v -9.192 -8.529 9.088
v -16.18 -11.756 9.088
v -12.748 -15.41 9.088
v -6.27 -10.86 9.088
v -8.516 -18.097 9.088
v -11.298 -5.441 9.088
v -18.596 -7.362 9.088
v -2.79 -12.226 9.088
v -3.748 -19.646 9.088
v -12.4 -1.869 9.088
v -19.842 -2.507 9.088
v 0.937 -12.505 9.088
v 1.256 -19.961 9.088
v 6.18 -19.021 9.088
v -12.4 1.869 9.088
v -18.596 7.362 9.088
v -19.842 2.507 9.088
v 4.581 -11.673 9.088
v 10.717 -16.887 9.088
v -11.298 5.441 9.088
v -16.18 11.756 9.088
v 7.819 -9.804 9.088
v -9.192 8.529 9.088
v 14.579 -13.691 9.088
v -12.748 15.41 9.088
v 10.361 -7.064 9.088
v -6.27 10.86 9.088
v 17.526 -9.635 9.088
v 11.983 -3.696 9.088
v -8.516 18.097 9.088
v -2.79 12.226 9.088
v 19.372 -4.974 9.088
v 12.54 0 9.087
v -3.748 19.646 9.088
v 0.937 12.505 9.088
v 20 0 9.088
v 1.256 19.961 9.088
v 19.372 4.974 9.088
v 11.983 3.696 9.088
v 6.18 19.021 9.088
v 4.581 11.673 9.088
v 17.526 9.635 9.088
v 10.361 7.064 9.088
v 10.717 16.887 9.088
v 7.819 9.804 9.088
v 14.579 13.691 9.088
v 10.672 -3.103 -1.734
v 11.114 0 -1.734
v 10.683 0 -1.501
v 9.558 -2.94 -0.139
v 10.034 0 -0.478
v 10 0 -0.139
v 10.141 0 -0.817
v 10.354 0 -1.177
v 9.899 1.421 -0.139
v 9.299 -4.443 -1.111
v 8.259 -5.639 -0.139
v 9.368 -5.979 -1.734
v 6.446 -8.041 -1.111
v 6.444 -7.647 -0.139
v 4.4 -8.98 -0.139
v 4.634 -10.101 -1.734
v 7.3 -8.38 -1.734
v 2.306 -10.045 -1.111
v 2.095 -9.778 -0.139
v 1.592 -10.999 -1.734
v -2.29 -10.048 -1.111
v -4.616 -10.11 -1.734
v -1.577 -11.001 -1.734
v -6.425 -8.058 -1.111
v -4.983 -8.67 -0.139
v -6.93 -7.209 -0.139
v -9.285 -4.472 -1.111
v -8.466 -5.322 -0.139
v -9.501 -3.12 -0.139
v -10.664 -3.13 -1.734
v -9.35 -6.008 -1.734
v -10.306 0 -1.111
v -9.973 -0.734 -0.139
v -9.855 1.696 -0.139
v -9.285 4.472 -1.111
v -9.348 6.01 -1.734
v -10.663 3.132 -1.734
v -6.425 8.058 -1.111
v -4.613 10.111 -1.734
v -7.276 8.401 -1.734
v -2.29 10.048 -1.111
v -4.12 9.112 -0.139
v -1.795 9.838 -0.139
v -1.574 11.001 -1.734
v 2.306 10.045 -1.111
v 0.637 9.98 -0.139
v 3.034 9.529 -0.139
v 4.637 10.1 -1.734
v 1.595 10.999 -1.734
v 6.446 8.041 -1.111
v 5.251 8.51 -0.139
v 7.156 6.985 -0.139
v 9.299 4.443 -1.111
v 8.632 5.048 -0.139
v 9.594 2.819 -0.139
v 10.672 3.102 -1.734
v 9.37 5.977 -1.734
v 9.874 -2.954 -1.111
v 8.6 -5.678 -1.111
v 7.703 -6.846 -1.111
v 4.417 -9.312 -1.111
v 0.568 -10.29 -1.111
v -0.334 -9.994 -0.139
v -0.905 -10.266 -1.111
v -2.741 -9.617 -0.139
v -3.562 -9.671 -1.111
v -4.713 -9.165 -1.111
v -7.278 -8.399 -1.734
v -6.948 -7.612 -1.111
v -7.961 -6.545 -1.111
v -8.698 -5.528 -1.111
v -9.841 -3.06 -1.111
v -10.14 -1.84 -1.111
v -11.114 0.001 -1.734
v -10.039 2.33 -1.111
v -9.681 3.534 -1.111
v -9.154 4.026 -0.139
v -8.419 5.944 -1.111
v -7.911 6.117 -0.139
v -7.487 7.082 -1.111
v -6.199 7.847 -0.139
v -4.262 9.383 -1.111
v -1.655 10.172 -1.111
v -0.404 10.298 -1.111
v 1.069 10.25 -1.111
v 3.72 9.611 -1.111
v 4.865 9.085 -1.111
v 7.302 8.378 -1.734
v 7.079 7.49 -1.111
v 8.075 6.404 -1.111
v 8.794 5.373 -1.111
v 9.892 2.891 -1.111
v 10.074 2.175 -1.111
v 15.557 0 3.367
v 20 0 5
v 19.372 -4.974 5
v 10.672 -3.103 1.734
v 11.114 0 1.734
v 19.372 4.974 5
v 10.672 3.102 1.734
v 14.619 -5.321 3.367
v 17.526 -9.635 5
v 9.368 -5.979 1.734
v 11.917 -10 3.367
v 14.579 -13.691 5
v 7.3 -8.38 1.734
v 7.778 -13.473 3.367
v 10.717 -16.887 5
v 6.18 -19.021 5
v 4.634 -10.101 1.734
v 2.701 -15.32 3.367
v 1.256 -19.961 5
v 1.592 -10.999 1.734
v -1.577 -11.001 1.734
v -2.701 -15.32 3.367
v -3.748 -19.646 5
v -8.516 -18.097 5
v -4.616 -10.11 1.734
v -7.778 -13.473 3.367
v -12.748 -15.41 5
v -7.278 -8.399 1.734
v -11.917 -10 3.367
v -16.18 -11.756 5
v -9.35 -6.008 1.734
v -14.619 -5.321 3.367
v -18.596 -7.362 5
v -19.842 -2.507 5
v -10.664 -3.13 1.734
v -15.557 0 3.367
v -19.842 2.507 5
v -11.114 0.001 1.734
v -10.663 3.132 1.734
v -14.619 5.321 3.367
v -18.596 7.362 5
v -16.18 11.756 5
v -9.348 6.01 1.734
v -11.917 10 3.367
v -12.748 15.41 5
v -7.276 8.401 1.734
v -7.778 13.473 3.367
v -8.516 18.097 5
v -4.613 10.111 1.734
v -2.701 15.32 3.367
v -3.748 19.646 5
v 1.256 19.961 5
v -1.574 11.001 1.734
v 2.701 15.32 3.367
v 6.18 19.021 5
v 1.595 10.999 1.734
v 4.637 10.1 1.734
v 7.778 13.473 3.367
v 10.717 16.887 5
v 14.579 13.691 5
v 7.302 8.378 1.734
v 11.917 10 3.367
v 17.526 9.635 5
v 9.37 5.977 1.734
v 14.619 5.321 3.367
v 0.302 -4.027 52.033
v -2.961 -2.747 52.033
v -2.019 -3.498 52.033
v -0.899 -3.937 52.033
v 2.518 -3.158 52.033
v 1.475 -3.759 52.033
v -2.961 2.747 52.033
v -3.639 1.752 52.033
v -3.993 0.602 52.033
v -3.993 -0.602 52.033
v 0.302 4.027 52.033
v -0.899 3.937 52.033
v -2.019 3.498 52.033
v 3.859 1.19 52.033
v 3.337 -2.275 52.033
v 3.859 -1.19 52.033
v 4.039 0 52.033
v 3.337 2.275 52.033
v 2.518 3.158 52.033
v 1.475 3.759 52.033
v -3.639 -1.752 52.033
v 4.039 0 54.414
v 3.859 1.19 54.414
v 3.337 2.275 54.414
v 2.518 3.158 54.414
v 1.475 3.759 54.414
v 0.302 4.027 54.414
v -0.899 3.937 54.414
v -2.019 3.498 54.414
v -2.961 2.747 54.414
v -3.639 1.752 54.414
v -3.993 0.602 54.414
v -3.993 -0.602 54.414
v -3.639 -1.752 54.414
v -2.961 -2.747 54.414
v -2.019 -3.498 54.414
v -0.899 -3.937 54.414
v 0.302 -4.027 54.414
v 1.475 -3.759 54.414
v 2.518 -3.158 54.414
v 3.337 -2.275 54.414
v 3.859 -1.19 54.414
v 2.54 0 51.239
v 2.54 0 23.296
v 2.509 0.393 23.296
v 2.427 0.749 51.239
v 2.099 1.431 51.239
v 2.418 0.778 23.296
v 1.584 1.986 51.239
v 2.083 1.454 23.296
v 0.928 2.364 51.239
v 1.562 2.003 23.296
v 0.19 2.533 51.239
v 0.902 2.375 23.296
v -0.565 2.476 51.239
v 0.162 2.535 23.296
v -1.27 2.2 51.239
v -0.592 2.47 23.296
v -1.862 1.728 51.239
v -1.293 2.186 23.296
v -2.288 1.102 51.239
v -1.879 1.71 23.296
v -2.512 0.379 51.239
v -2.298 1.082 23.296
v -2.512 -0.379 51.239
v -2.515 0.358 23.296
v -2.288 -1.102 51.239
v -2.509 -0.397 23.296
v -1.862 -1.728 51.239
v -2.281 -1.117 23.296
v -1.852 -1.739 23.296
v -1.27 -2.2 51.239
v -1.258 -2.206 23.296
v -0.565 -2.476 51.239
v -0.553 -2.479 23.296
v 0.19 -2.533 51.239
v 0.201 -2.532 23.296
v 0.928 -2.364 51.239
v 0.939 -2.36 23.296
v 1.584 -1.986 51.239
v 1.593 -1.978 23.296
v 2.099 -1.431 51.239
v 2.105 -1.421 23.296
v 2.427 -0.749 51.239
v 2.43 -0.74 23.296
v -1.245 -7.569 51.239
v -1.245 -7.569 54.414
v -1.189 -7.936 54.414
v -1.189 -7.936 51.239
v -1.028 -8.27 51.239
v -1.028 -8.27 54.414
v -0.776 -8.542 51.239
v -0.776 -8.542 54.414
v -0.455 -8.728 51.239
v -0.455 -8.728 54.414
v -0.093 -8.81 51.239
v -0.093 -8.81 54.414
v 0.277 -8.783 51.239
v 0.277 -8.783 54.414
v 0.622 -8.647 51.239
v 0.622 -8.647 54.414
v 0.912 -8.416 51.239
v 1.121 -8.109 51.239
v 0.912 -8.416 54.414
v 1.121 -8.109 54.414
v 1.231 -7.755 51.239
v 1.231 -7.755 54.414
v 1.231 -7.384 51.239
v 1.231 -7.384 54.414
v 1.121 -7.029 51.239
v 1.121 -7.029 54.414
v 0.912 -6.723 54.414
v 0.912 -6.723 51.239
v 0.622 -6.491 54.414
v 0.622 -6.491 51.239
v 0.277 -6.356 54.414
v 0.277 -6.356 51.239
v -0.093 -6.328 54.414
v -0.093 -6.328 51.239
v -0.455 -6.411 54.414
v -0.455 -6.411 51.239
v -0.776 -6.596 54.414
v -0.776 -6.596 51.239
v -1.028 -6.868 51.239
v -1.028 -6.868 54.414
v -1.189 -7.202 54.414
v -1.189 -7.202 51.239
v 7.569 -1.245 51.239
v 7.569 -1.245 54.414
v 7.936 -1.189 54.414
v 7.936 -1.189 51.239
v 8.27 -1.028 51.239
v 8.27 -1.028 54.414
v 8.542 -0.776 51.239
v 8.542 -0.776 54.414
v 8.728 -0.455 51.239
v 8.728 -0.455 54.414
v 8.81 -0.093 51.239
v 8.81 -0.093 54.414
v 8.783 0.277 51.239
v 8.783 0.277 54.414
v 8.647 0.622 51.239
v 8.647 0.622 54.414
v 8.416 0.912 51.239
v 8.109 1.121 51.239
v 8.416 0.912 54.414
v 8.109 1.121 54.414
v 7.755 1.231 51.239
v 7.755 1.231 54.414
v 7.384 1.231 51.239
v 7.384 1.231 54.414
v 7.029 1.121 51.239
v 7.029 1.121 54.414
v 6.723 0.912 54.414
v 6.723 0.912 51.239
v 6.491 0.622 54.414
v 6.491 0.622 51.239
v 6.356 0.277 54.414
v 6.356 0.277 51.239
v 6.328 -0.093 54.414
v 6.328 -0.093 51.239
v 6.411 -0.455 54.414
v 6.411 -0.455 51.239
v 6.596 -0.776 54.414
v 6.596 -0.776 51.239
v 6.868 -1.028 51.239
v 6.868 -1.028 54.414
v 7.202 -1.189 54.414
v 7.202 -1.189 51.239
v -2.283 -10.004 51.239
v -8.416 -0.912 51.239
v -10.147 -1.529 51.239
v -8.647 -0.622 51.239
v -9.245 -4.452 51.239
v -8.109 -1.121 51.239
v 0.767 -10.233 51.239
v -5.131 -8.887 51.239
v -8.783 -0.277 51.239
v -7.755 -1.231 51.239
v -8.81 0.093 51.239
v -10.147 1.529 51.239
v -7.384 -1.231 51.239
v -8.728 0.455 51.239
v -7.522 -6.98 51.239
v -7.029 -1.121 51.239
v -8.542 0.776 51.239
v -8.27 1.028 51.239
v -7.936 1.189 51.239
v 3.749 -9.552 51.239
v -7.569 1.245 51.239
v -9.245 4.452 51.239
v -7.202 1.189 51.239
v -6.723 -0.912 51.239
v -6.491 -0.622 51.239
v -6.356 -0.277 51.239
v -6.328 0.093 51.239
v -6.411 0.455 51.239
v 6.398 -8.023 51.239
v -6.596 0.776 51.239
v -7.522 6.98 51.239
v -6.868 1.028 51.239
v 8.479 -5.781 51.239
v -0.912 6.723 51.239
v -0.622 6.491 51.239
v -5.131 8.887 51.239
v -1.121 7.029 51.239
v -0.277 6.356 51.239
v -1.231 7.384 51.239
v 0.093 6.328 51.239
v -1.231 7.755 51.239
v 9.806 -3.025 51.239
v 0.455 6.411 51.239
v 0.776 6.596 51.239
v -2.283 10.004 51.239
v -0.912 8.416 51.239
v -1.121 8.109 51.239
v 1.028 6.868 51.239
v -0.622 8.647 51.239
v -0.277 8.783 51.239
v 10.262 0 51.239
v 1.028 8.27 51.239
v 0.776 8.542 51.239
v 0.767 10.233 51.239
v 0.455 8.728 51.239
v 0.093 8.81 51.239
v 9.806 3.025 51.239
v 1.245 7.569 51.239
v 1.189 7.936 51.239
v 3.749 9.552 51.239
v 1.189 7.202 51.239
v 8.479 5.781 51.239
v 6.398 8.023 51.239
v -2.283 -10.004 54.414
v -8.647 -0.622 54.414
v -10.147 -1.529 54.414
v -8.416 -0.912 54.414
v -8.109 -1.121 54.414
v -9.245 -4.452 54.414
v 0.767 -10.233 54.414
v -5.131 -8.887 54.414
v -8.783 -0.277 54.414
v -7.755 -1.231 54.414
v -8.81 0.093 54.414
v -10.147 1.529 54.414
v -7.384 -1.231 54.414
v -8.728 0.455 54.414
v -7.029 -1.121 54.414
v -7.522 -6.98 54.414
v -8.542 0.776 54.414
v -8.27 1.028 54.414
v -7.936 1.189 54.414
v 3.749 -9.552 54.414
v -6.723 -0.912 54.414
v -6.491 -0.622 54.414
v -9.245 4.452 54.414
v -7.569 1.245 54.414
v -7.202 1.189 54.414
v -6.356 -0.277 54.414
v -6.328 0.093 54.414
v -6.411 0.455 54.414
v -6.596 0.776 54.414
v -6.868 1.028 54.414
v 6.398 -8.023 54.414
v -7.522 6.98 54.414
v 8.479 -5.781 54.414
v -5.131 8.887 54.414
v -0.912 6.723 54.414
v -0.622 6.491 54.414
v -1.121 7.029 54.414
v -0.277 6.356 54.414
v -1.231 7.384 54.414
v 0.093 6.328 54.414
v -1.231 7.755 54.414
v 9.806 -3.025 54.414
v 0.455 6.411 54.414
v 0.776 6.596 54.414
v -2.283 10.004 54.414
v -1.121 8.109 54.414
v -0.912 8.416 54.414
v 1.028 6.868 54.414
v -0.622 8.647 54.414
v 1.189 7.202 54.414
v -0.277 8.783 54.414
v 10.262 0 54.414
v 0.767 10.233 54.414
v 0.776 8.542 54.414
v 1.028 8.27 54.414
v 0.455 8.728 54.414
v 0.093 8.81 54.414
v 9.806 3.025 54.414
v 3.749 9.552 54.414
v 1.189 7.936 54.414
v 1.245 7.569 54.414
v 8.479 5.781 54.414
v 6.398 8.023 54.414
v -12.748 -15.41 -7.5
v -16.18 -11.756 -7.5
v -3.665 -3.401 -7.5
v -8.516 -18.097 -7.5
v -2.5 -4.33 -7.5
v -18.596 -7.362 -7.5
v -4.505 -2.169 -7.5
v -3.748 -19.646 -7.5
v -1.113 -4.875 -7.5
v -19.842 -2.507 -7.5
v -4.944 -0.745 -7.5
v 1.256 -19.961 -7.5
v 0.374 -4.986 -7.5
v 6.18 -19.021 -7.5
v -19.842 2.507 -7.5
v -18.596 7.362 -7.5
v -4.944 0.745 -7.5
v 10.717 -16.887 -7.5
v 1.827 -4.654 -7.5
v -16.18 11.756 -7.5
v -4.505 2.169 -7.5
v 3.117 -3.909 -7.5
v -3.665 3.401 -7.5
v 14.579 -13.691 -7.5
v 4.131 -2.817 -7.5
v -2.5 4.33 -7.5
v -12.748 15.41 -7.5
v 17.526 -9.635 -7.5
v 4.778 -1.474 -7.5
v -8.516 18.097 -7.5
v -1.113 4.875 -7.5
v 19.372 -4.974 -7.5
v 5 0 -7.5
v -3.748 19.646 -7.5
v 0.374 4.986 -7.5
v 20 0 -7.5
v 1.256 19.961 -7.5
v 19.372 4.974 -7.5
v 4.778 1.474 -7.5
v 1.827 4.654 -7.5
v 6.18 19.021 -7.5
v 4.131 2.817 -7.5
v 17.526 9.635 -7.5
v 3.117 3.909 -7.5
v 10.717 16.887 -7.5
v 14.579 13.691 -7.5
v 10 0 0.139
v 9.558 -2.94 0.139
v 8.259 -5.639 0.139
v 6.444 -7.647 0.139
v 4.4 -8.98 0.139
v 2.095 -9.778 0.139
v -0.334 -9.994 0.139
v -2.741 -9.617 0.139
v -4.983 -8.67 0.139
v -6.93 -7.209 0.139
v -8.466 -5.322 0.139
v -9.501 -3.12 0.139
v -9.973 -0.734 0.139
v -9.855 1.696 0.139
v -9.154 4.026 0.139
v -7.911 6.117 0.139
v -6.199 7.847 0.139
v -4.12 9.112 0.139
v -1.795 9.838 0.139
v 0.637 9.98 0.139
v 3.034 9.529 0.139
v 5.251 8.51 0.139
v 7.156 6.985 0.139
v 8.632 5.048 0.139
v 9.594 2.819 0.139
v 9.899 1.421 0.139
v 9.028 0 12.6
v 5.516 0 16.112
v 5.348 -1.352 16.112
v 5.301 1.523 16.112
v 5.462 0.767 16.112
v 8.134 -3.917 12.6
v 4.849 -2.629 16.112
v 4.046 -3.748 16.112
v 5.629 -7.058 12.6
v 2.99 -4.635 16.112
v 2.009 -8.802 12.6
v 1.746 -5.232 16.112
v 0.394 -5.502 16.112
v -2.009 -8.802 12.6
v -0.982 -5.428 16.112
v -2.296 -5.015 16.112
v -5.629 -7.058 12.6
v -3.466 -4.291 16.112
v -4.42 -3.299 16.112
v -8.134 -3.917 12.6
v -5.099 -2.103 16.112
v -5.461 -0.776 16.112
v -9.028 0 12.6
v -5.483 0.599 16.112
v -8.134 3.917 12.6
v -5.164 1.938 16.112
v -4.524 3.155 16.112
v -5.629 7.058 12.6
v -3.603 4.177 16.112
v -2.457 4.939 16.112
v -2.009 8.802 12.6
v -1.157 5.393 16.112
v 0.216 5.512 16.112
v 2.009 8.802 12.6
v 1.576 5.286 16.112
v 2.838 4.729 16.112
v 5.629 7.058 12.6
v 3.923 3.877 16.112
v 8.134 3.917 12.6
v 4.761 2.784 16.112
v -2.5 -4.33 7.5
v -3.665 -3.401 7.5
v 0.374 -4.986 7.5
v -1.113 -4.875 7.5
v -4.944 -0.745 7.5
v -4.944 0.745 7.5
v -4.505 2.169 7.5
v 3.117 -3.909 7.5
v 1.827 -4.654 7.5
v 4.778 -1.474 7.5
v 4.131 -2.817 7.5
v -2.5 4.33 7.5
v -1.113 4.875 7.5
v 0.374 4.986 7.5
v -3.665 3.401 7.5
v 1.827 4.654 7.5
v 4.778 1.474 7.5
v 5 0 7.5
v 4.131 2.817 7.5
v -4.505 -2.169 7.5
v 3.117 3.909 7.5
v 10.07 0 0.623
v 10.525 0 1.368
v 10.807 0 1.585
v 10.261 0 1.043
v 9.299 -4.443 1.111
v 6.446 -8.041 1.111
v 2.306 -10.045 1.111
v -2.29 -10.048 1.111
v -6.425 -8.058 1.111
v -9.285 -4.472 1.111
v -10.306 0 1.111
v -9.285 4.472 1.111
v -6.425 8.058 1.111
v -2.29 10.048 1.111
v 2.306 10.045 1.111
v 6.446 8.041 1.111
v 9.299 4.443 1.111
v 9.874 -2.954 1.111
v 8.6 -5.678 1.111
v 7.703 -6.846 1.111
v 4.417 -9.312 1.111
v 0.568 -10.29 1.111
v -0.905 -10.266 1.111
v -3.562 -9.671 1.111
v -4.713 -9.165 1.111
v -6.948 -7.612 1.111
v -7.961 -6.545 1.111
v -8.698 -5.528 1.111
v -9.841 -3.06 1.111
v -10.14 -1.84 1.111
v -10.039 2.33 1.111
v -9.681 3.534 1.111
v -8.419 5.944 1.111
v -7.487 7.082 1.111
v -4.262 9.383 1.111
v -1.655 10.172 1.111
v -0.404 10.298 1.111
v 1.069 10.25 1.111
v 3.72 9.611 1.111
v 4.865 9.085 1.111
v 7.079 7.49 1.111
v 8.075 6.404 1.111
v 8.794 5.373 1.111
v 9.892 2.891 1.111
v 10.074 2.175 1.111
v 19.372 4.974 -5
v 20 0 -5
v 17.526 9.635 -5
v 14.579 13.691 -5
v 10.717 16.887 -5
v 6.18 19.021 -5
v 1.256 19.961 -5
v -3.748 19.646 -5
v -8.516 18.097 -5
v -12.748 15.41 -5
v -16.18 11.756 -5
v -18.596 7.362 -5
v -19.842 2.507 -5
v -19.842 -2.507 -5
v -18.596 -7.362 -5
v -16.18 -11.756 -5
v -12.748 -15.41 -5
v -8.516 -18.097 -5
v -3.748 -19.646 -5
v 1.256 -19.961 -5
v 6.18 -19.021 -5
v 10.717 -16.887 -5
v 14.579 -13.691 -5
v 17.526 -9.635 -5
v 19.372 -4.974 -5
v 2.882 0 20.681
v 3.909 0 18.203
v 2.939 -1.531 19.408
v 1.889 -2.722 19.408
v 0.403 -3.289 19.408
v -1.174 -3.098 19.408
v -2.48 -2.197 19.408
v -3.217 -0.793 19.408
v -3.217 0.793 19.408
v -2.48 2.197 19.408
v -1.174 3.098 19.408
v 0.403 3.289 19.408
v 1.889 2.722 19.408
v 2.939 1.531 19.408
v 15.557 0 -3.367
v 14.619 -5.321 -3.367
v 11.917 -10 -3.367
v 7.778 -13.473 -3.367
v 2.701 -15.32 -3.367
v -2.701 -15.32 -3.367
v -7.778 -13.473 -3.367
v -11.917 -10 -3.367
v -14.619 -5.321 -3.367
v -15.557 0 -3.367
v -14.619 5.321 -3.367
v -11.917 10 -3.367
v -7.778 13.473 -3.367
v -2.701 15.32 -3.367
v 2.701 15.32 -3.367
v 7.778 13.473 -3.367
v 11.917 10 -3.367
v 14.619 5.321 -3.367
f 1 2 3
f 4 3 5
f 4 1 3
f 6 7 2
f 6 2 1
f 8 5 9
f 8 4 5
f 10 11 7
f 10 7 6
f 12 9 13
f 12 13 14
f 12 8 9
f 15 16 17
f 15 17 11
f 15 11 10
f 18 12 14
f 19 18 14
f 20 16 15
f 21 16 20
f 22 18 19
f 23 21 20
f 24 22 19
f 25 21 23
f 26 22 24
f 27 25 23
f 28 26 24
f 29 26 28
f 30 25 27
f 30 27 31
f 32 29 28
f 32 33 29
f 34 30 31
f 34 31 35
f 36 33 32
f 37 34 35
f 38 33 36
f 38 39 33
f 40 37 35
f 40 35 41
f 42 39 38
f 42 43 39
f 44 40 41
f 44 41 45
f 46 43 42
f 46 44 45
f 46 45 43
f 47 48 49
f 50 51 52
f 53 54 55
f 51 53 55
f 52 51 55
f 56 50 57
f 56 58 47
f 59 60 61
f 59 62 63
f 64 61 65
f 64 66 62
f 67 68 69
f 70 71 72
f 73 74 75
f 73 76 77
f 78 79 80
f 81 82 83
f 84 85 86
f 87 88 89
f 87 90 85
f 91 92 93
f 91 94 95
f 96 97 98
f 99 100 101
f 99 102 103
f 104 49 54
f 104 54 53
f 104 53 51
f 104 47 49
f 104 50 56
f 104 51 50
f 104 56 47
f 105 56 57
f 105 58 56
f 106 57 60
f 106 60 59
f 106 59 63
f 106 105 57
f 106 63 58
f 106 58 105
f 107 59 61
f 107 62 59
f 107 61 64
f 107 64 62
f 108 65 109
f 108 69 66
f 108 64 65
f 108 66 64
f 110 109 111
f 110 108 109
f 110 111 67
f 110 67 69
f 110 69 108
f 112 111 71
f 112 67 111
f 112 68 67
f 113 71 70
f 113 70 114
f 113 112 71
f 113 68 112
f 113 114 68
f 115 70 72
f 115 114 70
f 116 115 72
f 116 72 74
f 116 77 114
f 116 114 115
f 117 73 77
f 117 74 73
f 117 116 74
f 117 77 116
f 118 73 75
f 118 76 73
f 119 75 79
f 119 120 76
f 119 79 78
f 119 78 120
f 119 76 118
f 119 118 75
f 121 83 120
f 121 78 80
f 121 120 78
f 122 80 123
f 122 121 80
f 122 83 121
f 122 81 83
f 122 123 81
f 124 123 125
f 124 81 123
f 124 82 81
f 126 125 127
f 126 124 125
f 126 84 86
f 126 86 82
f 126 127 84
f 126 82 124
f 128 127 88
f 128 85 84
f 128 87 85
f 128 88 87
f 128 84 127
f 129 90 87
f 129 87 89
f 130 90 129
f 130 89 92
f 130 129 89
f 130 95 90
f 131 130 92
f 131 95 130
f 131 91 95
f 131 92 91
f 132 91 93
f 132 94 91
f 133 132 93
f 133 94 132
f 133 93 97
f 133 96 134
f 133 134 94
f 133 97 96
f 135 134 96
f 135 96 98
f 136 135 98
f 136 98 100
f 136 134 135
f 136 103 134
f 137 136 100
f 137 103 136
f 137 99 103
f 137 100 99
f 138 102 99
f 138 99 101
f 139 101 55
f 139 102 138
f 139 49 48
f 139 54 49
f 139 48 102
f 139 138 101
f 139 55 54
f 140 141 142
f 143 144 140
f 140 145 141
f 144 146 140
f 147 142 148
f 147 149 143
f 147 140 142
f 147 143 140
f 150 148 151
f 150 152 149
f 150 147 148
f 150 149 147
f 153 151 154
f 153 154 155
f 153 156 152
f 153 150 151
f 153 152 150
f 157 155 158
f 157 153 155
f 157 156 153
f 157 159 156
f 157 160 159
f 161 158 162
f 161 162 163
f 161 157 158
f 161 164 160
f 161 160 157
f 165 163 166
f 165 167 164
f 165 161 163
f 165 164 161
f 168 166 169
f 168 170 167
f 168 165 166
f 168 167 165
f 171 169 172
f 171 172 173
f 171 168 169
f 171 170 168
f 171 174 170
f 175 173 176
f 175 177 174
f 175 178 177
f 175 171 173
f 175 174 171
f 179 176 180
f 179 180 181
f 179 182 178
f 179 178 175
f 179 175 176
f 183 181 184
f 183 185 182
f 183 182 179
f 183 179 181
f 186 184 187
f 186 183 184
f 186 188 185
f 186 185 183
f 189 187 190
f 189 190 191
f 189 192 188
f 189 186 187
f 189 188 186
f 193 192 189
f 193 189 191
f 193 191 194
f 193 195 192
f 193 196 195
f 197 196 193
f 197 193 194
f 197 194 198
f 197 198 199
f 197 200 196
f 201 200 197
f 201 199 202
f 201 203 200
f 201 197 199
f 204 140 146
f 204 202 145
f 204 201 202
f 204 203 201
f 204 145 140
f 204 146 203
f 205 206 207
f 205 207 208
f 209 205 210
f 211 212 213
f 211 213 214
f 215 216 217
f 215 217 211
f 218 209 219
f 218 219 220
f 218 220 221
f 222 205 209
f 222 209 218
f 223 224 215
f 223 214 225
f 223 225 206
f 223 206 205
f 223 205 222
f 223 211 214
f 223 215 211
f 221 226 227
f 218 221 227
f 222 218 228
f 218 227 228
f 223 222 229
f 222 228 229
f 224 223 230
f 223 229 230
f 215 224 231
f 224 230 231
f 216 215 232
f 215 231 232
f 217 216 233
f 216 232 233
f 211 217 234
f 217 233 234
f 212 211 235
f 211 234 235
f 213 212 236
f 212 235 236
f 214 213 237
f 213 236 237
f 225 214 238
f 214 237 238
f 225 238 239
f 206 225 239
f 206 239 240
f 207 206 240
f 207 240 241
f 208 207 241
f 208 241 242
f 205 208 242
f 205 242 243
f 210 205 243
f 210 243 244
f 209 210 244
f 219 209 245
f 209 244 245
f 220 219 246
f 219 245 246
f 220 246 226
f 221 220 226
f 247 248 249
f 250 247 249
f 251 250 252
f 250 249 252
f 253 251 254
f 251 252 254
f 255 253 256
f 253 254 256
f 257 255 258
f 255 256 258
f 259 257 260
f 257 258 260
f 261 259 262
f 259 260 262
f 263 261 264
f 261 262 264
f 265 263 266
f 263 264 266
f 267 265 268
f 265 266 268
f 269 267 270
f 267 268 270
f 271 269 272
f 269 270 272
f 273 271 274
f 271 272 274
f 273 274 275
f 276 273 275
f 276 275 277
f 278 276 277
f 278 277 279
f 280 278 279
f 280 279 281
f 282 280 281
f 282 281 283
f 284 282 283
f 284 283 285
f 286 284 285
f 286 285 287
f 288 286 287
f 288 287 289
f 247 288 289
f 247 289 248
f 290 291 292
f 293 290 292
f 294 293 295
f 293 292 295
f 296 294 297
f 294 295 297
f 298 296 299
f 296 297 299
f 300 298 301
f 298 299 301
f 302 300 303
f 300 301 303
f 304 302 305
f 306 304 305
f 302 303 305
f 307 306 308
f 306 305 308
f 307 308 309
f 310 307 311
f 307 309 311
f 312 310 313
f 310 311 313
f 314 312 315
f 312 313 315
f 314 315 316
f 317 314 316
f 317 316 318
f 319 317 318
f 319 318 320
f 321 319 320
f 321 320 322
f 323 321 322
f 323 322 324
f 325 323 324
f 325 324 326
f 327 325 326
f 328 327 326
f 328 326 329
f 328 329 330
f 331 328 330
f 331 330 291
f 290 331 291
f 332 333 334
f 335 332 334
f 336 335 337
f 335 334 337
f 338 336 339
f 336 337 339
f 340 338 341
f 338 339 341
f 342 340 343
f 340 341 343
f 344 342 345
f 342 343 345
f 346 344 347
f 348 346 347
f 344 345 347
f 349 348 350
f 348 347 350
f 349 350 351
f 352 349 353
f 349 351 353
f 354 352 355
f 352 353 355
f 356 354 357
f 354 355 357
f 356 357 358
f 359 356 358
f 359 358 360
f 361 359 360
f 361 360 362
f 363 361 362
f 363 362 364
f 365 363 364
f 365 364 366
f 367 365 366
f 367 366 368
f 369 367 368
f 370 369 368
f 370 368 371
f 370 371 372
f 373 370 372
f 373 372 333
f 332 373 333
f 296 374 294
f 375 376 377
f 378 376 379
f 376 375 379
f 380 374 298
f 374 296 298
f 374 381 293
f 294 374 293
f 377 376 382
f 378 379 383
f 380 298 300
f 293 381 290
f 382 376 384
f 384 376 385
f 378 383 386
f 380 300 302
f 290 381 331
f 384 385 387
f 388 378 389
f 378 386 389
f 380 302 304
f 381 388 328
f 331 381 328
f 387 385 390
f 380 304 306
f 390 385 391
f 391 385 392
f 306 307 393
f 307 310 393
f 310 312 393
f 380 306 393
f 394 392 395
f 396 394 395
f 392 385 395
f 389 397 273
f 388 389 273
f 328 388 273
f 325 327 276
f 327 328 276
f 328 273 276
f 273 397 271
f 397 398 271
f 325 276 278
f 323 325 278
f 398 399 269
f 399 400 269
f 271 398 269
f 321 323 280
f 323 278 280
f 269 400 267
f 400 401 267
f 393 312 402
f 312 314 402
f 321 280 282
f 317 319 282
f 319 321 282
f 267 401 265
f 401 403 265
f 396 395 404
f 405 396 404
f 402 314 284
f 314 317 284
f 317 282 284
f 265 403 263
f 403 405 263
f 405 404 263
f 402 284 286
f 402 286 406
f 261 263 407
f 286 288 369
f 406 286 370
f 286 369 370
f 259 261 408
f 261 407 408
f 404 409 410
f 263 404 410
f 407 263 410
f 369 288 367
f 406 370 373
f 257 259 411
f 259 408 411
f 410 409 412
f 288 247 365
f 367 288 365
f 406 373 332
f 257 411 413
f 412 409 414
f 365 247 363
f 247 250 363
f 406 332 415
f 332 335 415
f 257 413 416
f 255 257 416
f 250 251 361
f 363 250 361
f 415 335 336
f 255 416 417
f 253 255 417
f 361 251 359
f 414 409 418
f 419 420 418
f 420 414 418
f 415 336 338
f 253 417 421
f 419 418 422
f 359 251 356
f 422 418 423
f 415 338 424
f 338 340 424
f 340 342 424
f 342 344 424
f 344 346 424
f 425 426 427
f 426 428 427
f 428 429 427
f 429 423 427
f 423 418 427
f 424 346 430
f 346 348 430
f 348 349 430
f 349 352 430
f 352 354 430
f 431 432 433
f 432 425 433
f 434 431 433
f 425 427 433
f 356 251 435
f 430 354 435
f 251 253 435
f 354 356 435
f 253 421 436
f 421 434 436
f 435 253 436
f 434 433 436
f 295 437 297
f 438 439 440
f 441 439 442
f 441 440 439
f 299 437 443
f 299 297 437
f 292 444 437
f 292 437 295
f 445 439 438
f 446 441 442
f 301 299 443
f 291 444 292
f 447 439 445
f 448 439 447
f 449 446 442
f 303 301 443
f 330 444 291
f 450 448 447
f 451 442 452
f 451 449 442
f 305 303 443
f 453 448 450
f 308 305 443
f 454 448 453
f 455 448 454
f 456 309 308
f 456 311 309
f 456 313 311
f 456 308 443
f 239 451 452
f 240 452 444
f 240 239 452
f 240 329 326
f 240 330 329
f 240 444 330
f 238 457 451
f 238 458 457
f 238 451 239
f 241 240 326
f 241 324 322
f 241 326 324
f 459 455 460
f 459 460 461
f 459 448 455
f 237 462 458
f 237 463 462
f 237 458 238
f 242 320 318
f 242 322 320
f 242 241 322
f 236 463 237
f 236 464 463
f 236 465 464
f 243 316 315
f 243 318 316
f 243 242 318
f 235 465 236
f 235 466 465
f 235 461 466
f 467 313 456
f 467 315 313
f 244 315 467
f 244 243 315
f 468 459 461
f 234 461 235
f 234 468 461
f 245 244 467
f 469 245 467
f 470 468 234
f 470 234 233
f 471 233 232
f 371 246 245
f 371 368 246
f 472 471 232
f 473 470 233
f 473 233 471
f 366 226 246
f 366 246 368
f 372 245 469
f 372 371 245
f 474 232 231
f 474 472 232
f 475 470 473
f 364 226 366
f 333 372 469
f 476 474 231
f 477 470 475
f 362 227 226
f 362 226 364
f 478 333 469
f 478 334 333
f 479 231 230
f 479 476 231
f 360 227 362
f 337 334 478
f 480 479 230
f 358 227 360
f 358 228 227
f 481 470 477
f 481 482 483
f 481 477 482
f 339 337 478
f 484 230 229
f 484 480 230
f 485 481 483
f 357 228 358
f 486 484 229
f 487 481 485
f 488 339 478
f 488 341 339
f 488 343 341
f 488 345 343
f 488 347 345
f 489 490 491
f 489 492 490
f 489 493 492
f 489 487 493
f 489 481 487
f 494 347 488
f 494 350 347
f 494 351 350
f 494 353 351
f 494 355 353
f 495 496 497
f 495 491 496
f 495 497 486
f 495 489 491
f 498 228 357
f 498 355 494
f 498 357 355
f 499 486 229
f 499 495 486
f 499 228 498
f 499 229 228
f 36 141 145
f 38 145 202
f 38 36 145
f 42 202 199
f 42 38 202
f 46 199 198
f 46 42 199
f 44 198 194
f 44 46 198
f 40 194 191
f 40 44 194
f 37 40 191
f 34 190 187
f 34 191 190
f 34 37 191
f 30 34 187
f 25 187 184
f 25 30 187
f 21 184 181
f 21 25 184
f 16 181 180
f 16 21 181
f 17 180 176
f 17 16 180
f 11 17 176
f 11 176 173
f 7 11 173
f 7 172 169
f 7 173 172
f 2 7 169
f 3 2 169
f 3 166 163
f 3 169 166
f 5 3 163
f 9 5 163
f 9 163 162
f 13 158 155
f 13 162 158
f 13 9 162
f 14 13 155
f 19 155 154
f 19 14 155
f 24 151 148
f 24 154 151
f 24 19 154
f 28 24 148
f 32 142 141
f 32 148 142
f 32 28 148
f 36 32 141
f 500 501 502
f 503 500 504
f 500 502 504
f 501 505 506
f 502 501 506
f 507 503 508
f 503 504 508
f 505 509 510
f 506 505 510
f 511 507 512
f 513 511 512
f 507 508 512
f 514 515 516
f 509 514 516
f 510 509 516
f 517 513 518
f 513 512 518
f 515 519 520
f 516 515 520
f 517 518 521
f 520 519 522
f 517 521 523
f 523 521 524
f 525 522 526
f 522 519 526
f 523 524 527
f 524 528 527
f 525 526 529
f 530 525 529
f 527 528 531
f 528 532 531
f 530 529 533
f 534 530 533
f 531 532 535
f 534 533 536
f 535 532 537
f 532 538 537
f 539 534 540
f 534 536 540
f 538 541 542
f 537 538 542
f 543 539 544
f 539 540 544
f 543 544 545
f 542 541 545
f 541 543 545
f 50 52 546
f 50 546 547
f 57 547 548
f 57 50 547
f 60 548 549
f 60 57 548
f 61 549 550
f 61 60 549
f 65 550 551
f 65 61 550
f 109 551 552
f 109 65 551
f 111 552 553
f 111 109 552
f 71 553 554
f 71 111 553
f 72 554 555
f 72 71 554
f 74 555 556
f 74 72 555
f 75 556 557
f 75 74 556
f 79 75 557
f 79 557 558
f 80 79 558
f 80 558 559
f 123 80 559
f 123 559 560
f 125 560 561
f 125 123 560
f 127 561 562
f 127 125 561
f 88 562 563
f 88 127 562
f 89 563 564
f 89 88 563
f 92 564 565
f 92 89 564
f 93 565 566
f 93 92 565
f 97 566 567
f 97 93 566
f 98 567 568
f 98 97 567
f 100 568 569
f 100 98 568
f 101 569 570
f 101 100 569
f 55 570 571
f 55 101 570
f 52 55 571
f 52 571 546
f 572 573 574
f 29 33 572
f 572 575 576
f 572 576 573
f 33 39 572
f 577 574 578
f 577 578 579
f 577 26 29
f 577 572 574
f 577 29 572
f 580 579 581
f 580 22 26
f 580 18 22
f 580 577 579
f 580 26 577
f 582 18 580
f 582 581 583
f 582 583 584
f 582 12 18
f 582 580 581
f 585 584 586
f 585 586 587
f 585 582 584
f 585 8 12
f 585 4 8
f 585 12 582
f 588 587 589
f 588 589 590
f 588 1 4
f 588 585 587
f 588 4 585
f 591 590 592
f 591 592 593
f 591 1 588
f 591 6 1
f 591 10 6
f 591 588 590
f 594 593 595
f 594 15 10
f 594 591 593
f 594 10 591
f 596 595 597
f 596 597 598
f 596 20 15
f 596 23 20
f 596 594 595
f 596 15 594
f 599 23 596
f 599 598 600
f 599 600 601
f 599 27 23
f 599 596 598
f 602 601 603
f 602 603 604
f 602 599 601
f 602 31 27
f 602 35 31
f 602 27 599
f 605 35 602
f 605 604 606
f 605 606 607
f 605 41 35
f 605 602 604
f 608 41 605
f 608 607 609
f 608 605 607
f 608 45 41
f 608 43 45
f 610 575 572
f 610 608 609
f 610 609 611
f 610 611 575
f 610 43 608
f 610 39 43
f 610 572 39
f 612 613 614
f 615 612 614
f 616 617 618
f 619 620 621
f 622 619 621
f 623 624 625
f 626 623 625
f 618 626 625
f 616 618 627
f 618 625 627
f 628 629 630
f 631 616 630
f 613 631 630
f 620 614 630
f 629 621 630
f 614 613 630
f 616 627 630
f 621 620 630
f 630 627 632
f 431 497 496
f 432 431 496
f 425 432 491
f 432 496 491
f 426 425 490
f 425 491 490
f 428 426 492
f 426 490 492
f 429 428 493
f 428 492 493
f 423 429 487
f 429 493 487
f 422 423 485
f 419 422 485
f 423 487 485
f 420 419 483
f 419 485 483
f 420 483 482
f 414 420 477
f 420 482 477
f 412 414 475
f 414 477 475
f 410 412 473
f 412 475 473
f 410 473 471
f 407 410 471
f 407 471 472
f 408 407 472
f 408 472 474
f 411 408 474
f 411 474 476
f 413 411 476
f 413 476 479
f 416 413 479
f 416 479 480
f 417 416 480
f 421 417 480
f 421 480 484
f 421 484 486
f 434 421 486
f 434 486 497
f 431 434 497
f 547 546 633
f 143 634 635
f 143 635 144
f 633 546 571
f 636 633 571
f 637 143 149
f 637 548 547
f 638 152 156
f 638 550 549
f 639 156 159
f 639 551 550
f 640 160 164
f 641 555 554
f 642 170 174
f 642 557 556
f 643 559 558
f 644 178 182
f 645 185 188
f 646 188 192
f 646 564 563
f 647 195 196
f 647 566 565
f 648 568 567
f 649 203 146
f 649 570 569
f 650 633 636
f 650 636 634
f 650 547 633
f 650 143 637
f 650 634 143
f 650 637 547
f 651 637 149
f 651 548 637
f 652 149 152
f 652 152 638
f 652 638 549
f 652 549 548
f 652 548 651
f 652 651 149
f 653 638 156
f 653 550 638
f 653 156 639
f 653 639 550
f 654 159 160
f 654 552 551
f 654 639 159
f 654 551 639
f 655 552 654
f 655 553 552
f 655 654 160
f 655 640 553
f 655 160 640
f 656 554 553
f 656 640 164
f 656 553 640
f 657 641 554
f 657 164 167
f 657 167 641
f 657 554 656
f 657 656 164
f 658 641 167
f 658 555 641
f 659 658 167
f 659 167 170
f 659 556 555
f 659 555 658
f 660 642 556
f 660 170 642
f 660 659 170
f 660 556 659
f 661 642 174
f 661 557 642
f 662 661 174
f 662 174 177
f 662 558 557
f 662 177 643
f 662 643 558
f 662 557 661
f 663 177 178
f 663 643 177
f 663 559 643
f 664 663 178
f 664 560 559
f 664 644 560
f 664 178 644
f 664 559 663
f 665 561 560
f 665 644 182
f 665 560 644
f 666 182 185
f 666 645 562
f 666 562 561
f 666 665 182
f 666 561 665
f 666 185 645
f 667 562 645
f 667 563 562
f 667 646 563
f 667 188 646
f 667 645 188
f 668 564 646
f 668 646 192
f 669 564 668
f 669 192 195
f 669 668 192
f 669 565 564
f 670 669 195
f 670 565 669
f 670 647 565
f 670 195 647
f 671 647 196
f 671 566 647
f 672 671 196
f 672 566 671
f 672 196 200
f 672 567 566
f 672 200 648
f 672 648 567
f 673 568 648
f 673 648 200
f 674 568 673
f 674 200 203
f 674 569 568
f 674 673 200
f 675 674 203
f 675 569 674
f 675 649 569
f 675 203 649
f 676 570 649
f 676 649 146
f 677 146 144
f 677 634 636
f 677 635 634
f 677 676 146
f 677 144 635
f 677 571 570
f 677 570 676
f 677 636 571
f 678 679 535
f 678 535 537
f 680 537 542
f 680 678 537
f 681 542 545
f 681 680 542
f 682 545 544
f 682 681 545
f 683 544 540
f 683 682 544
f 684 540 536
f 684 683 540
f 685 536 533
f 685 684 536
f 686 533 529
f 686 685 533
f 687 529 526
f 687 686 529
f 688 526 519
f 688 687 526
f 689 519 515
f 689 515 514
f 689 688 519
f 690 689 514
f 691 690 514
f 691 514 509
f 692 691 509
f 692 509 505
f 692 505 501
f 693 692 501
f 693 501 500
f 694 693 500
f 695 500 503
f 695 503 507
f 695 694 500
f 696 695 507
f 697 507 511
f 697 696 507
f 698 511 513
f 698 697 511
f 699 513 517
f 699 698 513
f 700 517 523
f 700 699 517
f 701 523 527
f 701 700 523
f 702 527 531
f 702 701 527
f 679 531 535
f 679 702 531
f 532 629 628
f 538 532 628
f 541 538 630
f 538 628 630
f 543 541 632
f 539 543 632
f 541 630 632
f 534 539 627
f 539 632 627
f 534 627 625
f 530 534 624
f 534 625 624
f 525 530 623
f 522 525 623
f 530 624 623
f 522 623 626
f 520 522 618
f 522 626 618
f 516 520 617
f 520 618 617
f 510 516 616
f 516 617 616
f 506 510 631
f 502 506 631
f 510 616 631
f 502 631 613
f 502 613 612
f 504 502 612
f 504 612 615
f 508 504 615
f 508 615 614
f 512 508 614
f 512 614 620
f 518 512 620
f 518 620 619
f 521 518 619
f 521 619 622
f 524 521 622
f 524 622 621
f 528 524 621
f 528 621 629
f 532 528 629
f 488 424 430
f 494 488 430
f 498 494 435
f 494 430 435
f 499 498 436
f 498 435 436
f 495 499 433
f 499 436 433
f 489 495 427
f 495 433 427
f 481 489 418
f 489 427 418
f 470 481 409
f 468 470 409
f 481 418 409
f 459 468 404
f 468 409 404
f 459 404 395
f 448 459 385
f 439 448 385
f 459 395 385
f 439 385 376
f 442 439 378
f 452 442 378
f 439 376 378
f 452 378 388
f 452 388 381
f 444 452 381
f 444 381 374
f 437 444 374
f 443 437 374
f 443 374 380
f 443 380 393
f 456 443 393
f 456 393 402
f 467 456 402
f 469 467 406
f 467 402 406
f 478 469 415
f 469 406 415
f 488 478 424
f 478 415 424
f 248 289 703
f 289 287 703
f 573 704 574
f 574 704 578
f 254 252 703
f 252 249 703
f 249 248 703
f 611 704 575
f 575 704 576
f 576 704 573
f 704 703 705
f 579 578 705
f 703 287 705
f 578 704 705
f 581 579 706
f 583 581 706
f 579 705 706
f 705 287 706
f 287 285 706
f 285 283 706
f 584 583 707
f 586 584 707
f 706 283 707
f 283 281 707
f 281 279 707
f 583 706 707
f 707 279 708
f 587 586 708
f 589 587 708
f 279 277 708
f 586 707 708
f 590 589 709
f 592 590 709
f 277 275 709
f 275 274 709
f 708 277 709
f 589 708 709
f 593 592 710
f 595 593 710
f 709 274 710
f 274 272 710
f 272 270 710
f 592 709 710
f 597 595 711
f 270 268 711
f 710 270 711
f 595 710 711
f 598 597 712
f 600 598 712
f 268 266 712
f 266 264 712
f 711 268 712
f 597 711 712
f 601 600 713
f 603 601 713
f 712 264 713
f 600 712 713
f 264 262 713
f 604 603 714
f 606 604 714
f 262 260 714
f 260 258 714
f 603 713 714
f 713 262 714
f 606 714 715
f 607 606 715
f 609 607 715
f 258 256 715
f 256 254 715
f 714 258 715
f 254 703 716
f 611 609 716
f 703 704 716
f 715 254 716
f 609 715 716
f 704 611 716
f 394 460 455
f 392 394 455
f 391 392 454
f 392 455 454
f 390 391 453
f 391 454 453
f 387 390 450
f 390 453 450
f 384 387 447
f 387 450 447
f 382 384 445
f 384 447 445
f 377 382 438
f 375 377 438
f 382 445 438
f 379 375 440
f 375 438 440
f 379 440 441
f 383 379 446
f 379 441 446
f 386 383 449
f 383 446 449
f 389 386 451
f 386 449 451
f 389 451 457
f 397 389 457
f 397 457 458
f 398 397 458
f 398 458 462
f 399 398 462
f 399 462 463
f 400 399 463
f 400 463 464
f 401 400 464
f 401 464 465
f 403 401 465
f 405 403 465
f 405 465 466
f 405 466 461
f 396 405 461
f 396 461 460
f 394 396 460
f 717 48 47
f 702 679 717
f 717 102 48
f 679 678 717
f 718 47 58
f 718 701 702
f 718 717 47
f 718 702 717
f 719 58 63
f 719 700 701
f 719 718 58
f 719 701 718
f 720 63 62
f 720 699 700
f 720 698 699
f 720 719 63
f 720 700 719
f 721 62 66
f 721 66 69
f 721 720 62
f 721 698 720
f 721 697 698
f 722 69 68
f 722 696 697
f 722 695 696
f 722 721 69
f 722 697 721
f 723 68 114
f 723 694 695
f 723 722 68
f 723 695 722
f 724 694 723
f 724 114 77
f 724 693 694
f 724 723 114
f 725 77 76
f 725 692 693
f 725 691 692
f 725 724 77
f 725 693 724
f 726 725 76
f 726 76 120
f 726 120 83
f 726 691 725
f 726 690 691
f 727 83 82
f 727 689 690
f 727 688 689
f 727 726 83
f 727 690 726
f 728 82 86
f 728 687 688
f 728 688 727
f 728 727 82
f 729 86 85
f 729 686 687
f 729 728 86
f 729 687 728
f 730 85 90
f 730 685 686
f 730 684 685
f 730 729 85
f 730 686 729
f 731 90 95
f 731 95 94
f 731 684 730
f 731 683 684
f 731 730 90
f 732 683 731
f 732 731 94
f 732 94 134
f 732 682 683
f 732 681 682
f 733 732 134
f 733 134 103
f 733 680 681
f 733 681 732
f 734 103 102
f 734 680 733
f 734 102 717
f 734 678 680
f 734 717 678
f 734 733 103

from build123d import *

# Parameters (mm, degrees)
ESQUISSE1_R                  = 20
BOSS_EXTRU_1_DEPTH           = 7.5
CONG_1_R                     = 1.7
CONG_3_R                     = 1.7
ESQUISSE5_R                  = 5
ENL_V_MAT_EXTRU_1_DEPTH      = 33.015621312
ESQUISSE8_R                  = 2.54
BOSS_EXTRU_3_DEPTH           = 43.7388
BOSS_EXTRU_4_START           = 1.5875
ESQUISSE9_R                  = 20
BOSS_EXTRU_4_DEPTH           = 1.5875
ESQUISSE10_R                 = 10.2616
BOSS_EXTRU_5_DEPTH           = 3.175
ENL_V_MAT_EXTRU_3_REACH      = 70.068
ESQUISSE11_R                 = 1.2446
R_P_TITION_CIRCULAIRE2_COUNT = 4
ESQUISSE12_R                 = 4.0386
ENL_V_MAT_EXTRU_4_DEPTH      = 2.38125
CHAMFER1_SIZE                = 10
FILLET1_R                    = 10.16


with BuildPart() as part:
    # Esquisse1 → Boss.-Extru.1 (new, symmetric)
    with BuildSketch(Plane.XY):
        Circle(ESQUISSE1_R)
    extrude(amount=BOSS_EXTRU_1_DEPTH, both=True)

    # Esquisse4 → Enlèvement de matière-Révolution1 (revolve, cut)
    with BuildSketch(Plane(origin=(0, 0, 0), x_dir=(0, 0, -1), z_dir=(1, 0, 0)), mode=Mode.PRIVATE) as enl_vement_de_mati_re_r_volution1_sk:
        Polygon((-5, 20), (-1.324936438, 10), (1.324936438, 10), (5, 20), align=None)
    revolve(enl_vement_de_mati_re_r_volution1_sk.sketch.rotate(Axis((0, 0, 15.788572615), (0, 0, -1)), 90), axis=Axis((0, 0, 15.788572615), (0, 0, -1)), mode=Mode.SUBTRACT)

    # Congé1
    cong_1_edges = [part.edges().sort_by_distance(p)[0] for p in [
        (-10, 0, -1.324936438),
    ]]
    fillet(cong_1_edges, radius=CONG_1_R)

    # Congé3
    cong_3_edges = [part.edges().sort_by_distance(p)[0] for p in [
        (-10, 0, 1.324936438),
    ]]
    fillet(cong_3_edges, radius=CONG_3_R)

    # Esquisse5 → Enlèv. mat.-Extru.1 (cut, through all)
    with BuildSketch(Plane.XY.offset(7.5)):
        Circle(ESQUISSE5_R)
    extrude(amount=-ENL_V_MAT_EXTRU_1_DEPTH, mode=Mode.SUBTRACT)



with BuildPart() as body_2:
    # Esquisse8 → Boss.-Extru.3 (new body)
    with BuildSketch(Plane.XY.offset(7.5)):
        Circle(ESQUISSE8_R)
    extrude(amount=BOSS_EXTRU_3_DEPTH)


with BuildPart() as part_1:
    add(part.part)

    add(body_2.part)  # Boss.-Extru.4 merges body 2
    # Esquisse9 → Boss.-Extru.4 (add)
    with BuildSketch(Plane.XY.offset(7.5).offset(BOSS_EXTRU_4_START)):
        Circle(ESQUISSE9_R)
    extrude(amount=-BOSS_EXTRU_4_DEPTH)

    # Esquisse10 → Boss.-Extru.5 (add)
    with BuildSketch(Plane.XY.offset(51.2388)):
        Circle(ESQUISSE10_R)
    extrude(amount=BOSS_EXTRU_5_DEPTH)

    # Esquisse11 → Enlèv. mat.-Extru.3 (cut, up to next)
    with BuildSketch(Plane.XY.offset(54.4138), mode=Mode.PRIVATE) as enl_v_mat_extru_3_sk1:
        with Locations((0, 7.5692)):
            Circle(ESQUISSE11_R)
    enl_v_mat_extru_3_tool1 = extrude(enl_v_mat_extru_3_sk1.sketch, amount=-ENL_V_MAT_EXTRU_3_REACH, mode=Mode.PRIVATE) & part_1.part
    enl_v_mat_extru_3 = enl_v_mat_extru_3_tool1.solids().sort_by_distance((0, 7.5692, 54.4138))[0]
    add(enl_v_mat_extru_3, mode=Mode.SUBTRACT)

    # Répétition circulaire2: Enlèv. mat.-Extru.3 ×4 about axis
    r_p_tition_circulaire2_axis = Axis((0, 0, 0), (0, 0, 1))
    for i in range(1, R_P_TITION_CIRCULAIRE2_COUNT):
        add(enl_v_mat_extru_3.rotate(r_p_tition_circulaire2_axis, i * 360 / R_P_TITION_CIRCULAIRE2_COUNT), mode=Mode.SUBTRACT)

    # Esquisse12 → Enlèv. mat.-Extru.4 (cut)
    with BuildSketch(Plane.XY.offset(54.4138)):
        Circle(ESQUISSE12_R)
    extrude(amount=-ENL_V_MAT_EXTRU_4_DEPTH, mode=Mode.SUBTRACT)

    # Chamfer1
    chamfer1_edges = [part_1.edges().sort_by_distance(p)[0] for p in [
        (-2.54, 0, 9.0875),
    ]]
    chamfer(chamfer1_edges, length=CHAMFER1_SIZE)

    # Fillet1
    fillet1_edges = [part_1.edges().sort_by_distance(p)[0] for p in [
        (-2.54, 0, 19.0875),
    ]]
    fillet(fillet1_edges, radius=FILLET1_R)


solid = part_1.part
